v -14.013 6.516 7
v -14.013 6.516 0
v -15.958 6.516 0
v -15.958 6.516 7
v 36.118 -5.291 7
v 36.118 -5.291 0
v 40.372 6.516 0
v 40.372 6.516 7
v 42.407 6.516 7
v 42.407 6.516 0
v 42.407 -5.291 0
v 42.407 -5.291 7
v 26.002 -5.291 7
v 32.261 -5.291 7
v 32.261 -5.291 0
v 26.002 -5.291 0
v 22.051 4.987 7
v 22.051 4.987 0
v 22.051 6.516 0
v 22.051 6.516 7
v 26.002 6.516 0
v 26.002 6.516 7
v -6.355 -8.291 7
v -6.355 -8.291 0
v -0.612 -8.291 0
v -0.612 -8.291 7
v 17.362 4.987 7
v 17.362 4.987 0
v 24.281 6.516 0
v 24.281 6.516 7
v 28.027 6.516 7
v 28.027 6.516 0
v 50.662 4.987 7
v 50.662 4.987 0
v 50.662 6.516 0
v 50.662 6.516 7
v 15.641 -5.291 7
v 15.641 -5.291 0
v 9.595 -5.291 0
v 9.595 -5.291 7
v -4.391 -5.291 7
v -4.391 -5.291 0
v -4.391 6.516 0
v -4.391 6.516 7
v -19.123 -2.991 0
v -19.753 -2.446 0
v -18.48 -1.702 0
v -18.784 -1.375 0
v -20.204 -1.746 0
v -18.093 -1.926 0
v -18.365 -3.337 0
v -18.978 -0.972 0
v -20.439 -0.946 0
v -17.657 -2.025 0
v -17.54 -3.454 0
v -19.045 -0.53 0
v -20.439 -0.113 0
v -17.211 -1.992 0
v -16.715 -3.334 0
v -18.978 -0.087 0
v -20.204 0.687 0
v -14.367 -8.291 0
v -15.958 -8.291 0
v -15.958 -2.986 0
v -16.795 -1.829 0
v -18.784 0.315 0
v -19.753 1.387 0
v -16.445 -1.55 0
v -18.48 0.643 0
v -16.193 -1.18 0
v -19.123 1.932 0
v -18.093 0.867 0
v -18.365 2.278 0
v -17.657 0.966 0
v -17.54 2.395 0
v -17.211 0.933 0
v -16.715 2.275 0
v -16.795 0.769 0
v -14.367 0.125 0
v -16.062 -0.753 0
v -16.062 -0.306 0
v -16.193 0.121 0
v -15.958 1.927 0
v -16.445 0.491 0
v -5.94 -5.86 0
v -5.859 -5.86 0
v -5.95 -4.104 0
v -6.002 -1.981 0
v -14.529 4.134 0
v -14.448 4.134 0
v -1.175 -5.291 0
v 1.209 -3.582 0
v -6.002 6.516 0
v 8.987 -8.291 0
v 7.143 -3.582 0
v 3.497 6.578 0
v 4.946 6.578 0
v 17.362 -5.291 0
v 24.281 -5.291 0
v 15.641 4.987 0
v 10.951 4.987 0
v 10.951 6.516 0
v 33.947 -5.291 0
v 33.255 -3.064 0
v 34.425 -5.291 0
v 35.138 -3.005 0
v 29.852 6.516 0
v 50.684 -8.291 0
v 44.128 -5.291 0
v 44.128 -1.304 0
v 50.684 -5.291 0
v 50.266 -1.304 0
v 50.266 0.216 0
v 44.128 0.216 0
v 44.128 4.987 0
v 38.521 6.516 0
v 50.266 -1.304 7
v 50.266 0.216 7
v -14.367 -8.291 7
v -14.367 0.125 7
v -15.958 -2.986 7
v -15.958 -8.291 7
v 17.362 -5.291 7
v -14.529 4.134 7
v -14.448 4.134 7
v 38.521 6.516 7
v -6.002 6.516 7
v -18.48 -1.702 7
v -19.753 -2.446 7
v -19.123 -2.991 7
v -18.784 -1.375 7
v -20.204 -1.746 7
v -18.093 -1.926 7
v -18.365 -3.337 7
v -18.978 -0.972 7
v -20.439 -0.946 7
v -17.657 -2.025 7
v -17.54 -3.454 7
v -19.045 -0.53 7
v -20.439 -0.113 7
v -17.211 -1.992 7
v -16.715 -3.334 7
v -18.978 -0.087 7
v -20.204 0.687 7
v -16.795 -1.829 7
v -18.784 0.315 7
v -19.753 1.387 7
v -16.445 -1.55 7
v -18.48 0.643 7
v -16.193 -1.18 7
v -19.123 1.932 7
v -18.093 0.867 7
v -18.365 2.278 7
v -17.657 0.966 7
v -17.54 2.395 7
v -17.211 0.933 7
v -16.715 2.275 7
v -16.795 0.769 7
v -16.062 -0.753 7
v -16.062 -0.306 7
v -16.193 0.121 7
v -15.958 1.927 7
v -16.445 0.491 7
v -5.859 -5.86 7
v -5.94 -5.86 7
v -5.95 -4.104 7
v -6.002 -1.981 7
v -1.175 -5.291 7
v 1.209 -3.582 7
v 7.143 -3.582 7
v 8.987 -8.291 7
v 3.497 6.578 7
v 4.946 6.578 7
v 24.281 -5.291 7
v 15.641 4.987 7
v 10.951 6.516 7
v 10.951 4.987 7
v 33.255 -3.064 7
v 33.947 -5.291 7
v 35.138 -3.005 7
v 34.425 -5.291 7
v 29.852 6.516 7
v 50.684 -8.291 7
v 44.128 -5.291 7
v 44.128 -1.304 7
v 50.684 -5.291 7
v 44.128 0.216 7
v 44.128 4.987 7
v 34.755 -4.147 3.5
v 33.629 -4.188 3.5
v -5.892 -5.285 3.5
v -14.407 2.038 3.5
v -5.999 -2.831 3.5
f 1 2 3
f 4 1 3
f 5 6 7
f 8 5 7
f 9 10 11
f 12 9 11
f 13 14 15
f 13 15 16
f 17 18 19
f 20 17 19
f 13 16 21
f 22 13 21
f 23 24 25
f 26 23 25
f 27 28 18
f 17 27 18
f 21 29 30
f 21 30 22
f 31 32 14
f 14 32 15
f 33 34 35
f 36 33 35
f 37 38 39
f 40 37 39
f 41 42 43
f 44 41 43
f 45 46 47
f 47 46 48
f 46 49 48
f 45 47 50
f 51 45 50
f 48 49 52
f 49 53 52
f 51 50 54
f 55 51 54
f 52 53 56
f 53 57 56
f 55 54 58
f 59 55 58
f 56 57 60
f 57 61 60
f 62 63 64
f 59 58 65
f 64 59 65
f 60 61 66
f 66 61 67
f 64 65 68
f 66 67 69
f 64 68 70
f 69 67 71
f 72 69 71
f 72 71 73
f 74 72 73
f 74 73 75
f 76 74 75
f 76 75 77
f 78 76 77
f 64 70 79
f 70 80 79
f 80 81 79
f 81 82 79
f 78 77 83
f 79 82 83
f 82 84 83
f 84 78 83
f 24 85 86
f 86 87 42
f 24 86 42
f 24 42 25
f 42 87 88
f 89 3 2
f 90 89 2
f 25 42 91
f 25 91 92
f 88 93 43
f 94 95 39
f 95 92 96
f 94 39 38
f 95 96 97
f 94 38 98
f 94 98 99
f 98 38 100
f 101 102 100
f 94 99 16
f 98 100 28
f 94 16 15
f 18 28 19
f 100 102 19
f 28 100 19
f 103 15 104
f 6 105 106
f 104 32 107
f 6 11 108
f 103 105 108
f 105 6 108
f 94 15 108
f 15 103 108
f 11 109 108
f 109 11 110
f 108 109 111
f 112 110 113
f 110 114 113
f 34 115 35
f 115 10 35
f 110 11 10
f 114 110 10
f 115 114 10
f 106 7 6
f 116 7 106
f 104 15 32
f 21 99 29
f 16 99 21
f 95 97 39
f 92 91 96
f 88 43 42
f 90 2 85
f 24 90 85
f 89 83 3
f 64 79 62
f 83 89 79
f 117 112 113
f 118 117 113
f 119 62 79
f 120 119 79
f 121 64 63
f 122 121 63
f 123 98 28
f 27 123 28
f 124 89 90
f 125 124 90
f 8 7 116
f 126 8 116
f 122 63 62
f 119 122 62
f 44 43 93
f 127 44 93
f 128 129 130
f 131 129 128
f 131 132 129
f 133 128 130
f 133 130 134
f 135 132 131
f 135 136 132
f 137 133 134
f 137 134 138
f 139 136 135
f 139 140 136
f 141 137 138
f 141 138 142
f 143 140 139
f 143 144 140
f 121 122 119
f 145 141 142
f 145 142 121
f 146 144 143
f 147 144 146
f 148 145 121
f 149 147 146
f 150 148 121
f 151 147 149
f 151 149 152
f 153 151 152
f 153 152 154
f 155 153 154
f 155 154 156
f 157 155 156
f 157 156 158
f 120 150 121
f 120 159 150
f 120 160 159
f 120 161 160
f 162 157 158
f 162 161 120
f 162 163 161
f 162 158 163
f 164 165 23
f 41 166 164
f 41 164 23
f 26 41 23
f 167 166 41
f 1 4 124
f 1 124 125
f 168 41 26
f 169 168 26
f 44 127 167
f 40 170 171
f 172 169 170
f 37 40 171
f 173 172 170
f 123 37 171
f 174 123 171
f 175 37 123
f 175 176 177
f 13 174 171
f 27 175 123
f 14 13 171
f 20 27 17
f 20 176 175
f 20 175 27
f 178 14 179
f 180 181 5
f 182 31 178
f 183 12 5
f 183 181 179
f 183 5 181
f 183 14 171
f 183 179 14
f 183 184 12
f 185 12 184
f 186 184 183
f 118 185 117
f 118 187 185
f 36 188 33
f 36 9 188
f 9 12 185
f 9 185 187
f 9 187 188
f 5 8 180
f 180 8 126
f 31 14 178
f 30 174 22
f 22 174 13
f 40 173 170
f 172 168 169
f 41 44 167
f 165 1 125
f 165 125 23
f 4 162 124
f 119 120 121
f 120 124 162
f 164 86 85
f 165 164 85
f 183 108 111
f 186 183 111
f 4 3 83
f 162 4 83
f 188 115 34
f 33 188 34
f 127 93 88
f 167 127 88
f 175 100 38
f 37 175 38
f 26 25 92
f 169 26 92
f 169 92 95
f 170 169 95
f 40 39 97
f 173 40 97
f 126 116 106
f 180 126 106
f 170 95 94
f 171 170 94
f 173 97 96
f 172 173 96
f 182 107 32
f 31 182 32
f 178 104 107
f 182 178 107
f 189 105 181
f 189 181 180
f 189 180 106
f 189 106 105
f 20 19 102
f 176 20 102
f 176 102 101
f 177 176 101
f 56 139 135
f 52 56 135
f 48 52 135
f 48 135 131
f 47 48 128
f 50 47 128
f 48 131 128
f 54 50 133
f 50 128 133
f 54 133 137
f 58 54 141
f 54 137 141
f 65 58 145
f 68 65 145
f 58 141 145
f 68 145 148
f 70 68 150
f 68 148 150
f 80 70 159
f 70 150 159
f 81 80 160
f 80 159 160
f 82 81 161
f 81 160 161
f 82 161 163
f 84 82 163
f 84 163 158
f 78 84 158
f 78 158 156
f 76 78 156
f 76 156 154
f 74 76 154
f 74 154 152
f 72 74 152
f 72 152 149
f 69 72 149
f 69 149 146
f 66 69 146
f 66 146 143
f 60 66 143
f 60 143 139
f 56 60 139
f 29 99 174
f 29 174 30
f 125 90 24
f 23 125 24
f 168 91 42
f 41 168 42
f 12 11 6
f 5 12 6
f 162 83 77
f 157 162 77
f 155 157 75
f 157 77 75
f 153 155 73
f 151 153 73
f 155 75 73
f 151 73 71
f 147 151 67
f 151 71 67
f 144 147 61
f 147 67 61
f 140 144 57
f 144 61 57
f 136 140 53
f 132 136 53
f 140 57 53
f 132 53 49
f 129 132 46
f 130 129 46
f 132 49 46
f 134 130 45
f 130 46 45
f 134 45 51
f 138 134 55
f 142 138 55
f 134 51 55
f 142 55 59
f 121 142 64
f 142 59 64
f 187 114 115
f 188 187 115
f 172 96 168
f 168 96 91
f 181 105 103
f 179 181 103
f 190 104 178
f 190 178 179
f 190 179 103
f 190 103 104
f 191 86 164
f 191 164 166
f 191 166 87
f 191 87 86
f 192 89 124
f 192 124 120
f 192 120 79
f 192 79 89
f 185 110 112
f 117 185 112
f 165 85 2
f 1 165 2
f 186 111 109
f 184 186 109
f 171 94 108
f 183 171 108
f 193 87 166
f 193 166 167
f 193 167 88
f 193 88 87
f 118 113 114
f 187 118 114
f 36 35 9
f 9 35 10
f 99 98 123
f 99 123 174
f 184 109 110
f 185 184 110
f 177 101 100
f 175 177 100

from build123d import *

# Parameters (mm, degrees)
F0_R     = 1.5144006305
F0_W     = 6.9193018195
F0_H     = 3
F0_W_2   = 1.7209130052
F0_H_2   = 11.8076299829
F0_W_3   = 0.5121529102
F0_W_4   = 0.0222647793
F1_DEPTH = 7
F2_D     = 3


with BuildPart() as f1:
    # F0 (on Top) → F1 (new body)
    with BuildSketch(Plane.XY):
        Polygon((3.4971556998, 6.5780634755), (-1.1749863393, -5.2911434323), (-2.3558930525, -8.2911434323), (-2.2171302699, -8.2911434323), (-0.6122938118, -8.2911434323), (1.2090868077, -3.582129126), (7.1431578295, -3.582129126), (8.9872246844, -8.2911434323), (9.7287874669, -8.2911434323), (9.2608770356, -5.2911434323), (9.5946928185, -5.2911434323), (4.9458338793, 6.5780634755), align=None)
        with BuildLine():
            Line((4.8842569545, 2.556118015), (6.6084108505, -2.0329833323))
            Line((6.6084108505, -2.0329833323), (1.8183742747, -2.0329833323))
            Line((1.8183742747, -2.0329833323), (3.5587326246, 2.556118015))
            add(Edge.make_bspline(
                [(4.1971881087, 4.6918650404), (3.9735666447, 3.7195978058), (3.5587326246, 2.556118015)],
                knots=[0, 0, 0, 1, 1, 1], degree=2))
            add(Edge.make_bspline(
                [(4.8842569545, 2.556118015), (4.5504452039, 3.4279176354), (4.1971881087, 4.6918650404)],
                knots=[0, 0, 0, 1, 1, 1], degree=2))
        make_face(mode=Mode.SUBTRACT)
        with BuildLine():
            Line((-4.3911724636, -8.2911434323), (-4.3911724636, -5.2911434323))
            Line((-4.3911724636, -5.2911434323), (-4.3911724636, 6.5164865506))
            Line((-4.3911724636, 6.5164865506), (-6.0018951822, 6.5164865506))
            Line((-6.0018951822, 6.5164865506), (-6.0018951822, -1.9811290797))
            add(Edge.make_bspline(
                [(-5.9500409297, -4.1039125419), (-6.0213405269, -2.6195845638), (-6.0018951822, -1.9811290797)],
                knots=[0, 0, 0, 1, 1, 1], degree=2))
            add(Edge.make_bspline(
                [(-5.8592959878, -5.8604753458), (-5.8787413325, -5.5882405201), (-5.9500409297, -4.1039125419)],
                knots=[0, 0, 0, 1, 1, 1], degree=2))
            Line((-5.8592959878, -5.8604753458), (-5.9403182574, -5.8604753458))
            Line((-5.9403182574, -5.8604753458), (-14.0133771953, 6.5164865506))
            Line((-14.0133771953, 6.5164865506), (-15.9579116645, 6.5164865506))
            Line((-15.9579116645, 6.5164865506), (-15.9579116645, 1.9267558515))
            ThreePointArc((-15.9579116645, 1.9267558515), (-14.9764941477, 0.8688379816), (-14.6204570666, -0.5295926239))
            ThreePointArc((-14.6204570666, -0.5295926239), (-14.9764941477, -1.9280232295), (-15.9579116645, -2.9859410994))
            Line((-15.9579116645, -2.9859410994), (-15.9579116645, -8.2911434323))
            Line((-15.9579116645, -8.2911434323), (-14.3666342905, -8.2911434323))
            Line((-14.3666342905, -8.2911434323), (-14.3666342905, 0.1254499285))
            add(Edge.make_bspline(
                [(-14.5286788296, 4.1344318259), (-14.3666342905, 1.946830548), (-14.3666342905, 0.1254499285)],
                knots=[0, 0, 0, 1, 1, 1], degree=2))
            Line((-14.5286788296, 4.1344318259), (-14.4476565601, 4.1344318259))
            Line((-14.4476565601, 4.1344318259), (-6.3551522775, -8.2911434323))
            Line((-6.3551522775, -8.2911434323), (-4.4685006142, -8.2911434323))
            Line((-4.4685006142, -8.2911434323), (-4.3911724636, -8.2911434323))
        make_face()
        Polygon((42.4072904282, 6.5164865506), (42.4072904282, -5.2911434323), (42.4295552075, -5.2911434323), (42.9417081177, -5.2911434323), (44.1282034335, -5.2911434323), (44.1282034335, -1.3037829063), (50.2664505745, -1.3037829063), (50.2664505745, 0.2161948704), (44.1282034335, 0.2161948704), (44.1282034335, 4.9867861015), (50.6618392499, 4.9867861015), (50.6618392499, 6.5164865506), align=None)
        Polygon((15.6407734599, 4.9867861015), (15.6407734599, -5.2911434323), (17.3616864651, -5.2911434323), (17.3616864651, 4.9867861015), (22.0512554266, 4.9867861015), (22.0512554266, 6.5164865506), (10.9512044983, 6.5164865506), (10.9512044983, 4.9867861015), align=None)
        with BuildLine():
            Line((-15.9579116645, -2.9859410994), (-15.9579116645, 1.9267558515))
            ThreePointArc((-15.9579116645, 1.9267558515), (-20.4692033693, -0.5295926239), (-15.9579116645, -2.9859410994))
        make_face()
        with Locations((-17.544830218, -0.5295926239)):
            Circle(F0_R, mode=Mode.SUBTRACT)
        with BuildLine():
            add(Edge.make_bspline(
                [(34.4250094285, -5.2911434323), (34.7275498025, -4.1458172445), (35.1379724042, -3.0052505668)],
                knots=[0.3003379815, 0.3003379815, 0.3003379815, 1, 1, 1], degree=2))
            Line((34.4250094285, -5.2911434323), (36.1182664446, -5.2911434323))
            Line((36.1182664446, -5.2911434323), (40.3720110171, 6.5164865506))
            Line((40.3720110171, 6.5164865506), (38.5214623806, 6.5164865506))
            Line((38.5214623806, 6.5164865506), (35.1379724042, -3.0052505668))
        make_face()
        with BuildLine():
            Line((28.0274580286, 6.5164865506), (32.2605282654, -5.2911434323))
            Line((32.2605282654, -5.2911434323), (33.9465209728, -5.2911434323))
            add(Edge.make_bspline(
                [(33.2550148599, -3.0635866009), (33.6581748914, -4.1995623803), (33.9465209728, -5.2911434323)],
                knots=[0, 0, 0, 0.6872812565, 0.6872812565, 0.6872812565], degree=2))
            Line((33.2550148599, -3.0635866009), (29.8520795388, 6.5164865506))
            Line((29.8520795388, 6.5164865506), (28.0274580286, 6.5164865506))
        make_face()
        with Locations((20.8213373748, -6.7911434323)):
            Rectangle(F0_W, F0_H)
        Polygon((36.1182664446, -5.2911434323), (35.03750479, -8.2911434323), (42.4072904282, -8.2911434323), (42.4072904282, -5.2911434323), (41.7667254806, -5.2911434323), align=None)
        Polygon((32.2605282654, -5.2911434323), (26.0019012898, -5.2911434323), (26.0019012898, -8.2911434323), (33.3360371295, -8.2911434323), align=None)
        with Locations((25.1414447872, 0.6126715592)):
            Rectangle(F0_W_2, F0_H_2)
        Polygon((15.6407734599, -5.2911434323), (9.5946928185, -5.2911434323), (10.7697146145, -8.2911434323), (15.6407734599, -8.2911434323), align=None)
        with BuildLine():
            Line((1.8183742747, -2.0329833323), (6.6084108505, -2.0329833323))
            Line((6.6084108505, -2.0329833323), (4.8842569545, 2.556118015))
            add(Edge.make_bspline(
                [(4.8842569545, 2.556118015), (4.5504452039, 3.4279176354), (4.1971881087, 4.6918650404)],
                knots=[0, 0, 0, 1, 1, 1], degree=2))
            add(Edge.make_bspline(
                [(4.1971881087, 4.6918650404), (3.9735666447, 3.7195978058), (3.5587326246, 2.556118015)],
                knots=[0, 0, 0, 1, 1, 1], degree=2))
            Line((3.5587326246, 2.556118015), (1.8183742747, -2.0329833323))
        make_face()
        Polygon((42.9417081177, -5.2911434323), (42.9417081177, -8.2911434323), (50.6618392499, -8.2911434323), (50.6618392499, -6.7517203108), (44.1282034335, -6.7517203108), (44.1282034335, -5.2911434323), align=None)
        Polygon((50.6618392499, -6.7517203108), (50.6618392499, -8.2911434323), (50.6841652095, -8.2911434323), (50.6841652095, -5.2911434323), (44.1282034335, -5.2911434323), (44.1282034335, -6.7517203108), align=None)
        with BuildLine():
            Line((33.9465209728, -5.2911434323), (32.2605282654, -5.2911434323))
            Line((32.2605282654, -5.2911434323), (33.3360371295, -8.2911434323))
            Line((33.3360371295, -8.2911434323), (35.03750479, -8.2911434323))
            Line((35.03750479, -8.2911434323), (36.1182664446, -5.2911434323))
            Line((36.1182664446, -5.2911434323), (34.4250094285, -5.2911434323))
            add(Edge.make_bspline(
                [(34.1851505143, -6.2753093659), (34.2951404877, -5.7827878924), (34.4250094285, -5.2911434323)],
                knots=[0, 0, 0, 0.3003379815, 0.3003379815, 0.3003379815], degree=2))
            add(Edge.make_bspline(
                [(33.9465209728, -5.2911434323), (34.0777208613, -5.7878219779), (34.1851505143, -6.2753093659)],
                knots=[0.6872812565, 0.6872812565, 0.6872812565, 1, 1, 1], degree=2))
        make_face()
        Polygon((-1.1749863393, -5.2911434323), (-1.686436357, -5.2911434323), (-4.3911724636, -5.2911434323), (-4.3911724636, -8.2911434323), (-2.3558930525, -8.2911434323), align=None)
        with Locations((-17.544830218, -0.5295926239)):
            Circle(F0_R)
        with Locations((16.5012299625, -6.7911434323)):
            Rectangle(F0_W_2, F0_H)
        Polygon((26.0019012898, -5.2911434323), (24.2809882846, -5.2911434323), (24.2809882846, -8.2911434323), (25.8840639144, -8.2911434323), (26.0019012898, -8.2911434323), align=None)
        with BuildLine():
            ThreePointArc((-14.6204570666, -0.5295926239), (-14.9764941477, 0.8688379816), (-15.9579116645, 1.9267558515))
            Line((-15.9579116645, 1.9267558515), (-15.9579116645, -2.9859410994))
            ThreePointArc((-15.9579116645, -2.9859410994), (-14.9764941477, -1.9280232295), (-14.6204570666, -0.5295926239))
        make_face()
        Polygon((10.7697146145, -8.2911434323), (9.5946928185, -5.2911434323), (9.2608770356, -5.2911434323), (9.7287874669, -8.2911434323), align=None)
        with Locations((42.6856316626, -6.7911434323)):
            Rectangle(F0_W_3, F0_H)
        with BuildLine():
            Line((34.4250094285, -5.2911434323), (33.9465209728, -5.2911434323))
            add(Edge.make_bspline(
                [(33.9465209728, -5.2911434323), (34.0777208613, -5.7878219779), (34.1851505143, -6.2753093659)],
                knots=[0.6872812565, 0.6872812565, 0.6872812565, 1, 1, 1], degree=2))
            add(Edge.make_bspline(
                [(34.1851505143, -6.2753093659), (34.2951404877, -5.7827878924), (34.4250094285, -5.2911434323)],
                knots=[0, 0, 0, 0.3003379815, 0.3003379815, 0.3003379815], degree=2))
        make_face()
        with Locations((42.4184228179, -6.7911434323)):
            Rectangle(F0_W_4, F0_H)
    extrude(amount=F1_DEPTH)

    # F2 (through all)
    with Locations(Plane(origin=(0, 0, 0), x_dir=(1, 0, 0), z_dir=(0, 0, -1))):
        with Locations((-17.544830218, 0.5295926239)):
            Hole(F2_D / 2)


solid = f1.part
